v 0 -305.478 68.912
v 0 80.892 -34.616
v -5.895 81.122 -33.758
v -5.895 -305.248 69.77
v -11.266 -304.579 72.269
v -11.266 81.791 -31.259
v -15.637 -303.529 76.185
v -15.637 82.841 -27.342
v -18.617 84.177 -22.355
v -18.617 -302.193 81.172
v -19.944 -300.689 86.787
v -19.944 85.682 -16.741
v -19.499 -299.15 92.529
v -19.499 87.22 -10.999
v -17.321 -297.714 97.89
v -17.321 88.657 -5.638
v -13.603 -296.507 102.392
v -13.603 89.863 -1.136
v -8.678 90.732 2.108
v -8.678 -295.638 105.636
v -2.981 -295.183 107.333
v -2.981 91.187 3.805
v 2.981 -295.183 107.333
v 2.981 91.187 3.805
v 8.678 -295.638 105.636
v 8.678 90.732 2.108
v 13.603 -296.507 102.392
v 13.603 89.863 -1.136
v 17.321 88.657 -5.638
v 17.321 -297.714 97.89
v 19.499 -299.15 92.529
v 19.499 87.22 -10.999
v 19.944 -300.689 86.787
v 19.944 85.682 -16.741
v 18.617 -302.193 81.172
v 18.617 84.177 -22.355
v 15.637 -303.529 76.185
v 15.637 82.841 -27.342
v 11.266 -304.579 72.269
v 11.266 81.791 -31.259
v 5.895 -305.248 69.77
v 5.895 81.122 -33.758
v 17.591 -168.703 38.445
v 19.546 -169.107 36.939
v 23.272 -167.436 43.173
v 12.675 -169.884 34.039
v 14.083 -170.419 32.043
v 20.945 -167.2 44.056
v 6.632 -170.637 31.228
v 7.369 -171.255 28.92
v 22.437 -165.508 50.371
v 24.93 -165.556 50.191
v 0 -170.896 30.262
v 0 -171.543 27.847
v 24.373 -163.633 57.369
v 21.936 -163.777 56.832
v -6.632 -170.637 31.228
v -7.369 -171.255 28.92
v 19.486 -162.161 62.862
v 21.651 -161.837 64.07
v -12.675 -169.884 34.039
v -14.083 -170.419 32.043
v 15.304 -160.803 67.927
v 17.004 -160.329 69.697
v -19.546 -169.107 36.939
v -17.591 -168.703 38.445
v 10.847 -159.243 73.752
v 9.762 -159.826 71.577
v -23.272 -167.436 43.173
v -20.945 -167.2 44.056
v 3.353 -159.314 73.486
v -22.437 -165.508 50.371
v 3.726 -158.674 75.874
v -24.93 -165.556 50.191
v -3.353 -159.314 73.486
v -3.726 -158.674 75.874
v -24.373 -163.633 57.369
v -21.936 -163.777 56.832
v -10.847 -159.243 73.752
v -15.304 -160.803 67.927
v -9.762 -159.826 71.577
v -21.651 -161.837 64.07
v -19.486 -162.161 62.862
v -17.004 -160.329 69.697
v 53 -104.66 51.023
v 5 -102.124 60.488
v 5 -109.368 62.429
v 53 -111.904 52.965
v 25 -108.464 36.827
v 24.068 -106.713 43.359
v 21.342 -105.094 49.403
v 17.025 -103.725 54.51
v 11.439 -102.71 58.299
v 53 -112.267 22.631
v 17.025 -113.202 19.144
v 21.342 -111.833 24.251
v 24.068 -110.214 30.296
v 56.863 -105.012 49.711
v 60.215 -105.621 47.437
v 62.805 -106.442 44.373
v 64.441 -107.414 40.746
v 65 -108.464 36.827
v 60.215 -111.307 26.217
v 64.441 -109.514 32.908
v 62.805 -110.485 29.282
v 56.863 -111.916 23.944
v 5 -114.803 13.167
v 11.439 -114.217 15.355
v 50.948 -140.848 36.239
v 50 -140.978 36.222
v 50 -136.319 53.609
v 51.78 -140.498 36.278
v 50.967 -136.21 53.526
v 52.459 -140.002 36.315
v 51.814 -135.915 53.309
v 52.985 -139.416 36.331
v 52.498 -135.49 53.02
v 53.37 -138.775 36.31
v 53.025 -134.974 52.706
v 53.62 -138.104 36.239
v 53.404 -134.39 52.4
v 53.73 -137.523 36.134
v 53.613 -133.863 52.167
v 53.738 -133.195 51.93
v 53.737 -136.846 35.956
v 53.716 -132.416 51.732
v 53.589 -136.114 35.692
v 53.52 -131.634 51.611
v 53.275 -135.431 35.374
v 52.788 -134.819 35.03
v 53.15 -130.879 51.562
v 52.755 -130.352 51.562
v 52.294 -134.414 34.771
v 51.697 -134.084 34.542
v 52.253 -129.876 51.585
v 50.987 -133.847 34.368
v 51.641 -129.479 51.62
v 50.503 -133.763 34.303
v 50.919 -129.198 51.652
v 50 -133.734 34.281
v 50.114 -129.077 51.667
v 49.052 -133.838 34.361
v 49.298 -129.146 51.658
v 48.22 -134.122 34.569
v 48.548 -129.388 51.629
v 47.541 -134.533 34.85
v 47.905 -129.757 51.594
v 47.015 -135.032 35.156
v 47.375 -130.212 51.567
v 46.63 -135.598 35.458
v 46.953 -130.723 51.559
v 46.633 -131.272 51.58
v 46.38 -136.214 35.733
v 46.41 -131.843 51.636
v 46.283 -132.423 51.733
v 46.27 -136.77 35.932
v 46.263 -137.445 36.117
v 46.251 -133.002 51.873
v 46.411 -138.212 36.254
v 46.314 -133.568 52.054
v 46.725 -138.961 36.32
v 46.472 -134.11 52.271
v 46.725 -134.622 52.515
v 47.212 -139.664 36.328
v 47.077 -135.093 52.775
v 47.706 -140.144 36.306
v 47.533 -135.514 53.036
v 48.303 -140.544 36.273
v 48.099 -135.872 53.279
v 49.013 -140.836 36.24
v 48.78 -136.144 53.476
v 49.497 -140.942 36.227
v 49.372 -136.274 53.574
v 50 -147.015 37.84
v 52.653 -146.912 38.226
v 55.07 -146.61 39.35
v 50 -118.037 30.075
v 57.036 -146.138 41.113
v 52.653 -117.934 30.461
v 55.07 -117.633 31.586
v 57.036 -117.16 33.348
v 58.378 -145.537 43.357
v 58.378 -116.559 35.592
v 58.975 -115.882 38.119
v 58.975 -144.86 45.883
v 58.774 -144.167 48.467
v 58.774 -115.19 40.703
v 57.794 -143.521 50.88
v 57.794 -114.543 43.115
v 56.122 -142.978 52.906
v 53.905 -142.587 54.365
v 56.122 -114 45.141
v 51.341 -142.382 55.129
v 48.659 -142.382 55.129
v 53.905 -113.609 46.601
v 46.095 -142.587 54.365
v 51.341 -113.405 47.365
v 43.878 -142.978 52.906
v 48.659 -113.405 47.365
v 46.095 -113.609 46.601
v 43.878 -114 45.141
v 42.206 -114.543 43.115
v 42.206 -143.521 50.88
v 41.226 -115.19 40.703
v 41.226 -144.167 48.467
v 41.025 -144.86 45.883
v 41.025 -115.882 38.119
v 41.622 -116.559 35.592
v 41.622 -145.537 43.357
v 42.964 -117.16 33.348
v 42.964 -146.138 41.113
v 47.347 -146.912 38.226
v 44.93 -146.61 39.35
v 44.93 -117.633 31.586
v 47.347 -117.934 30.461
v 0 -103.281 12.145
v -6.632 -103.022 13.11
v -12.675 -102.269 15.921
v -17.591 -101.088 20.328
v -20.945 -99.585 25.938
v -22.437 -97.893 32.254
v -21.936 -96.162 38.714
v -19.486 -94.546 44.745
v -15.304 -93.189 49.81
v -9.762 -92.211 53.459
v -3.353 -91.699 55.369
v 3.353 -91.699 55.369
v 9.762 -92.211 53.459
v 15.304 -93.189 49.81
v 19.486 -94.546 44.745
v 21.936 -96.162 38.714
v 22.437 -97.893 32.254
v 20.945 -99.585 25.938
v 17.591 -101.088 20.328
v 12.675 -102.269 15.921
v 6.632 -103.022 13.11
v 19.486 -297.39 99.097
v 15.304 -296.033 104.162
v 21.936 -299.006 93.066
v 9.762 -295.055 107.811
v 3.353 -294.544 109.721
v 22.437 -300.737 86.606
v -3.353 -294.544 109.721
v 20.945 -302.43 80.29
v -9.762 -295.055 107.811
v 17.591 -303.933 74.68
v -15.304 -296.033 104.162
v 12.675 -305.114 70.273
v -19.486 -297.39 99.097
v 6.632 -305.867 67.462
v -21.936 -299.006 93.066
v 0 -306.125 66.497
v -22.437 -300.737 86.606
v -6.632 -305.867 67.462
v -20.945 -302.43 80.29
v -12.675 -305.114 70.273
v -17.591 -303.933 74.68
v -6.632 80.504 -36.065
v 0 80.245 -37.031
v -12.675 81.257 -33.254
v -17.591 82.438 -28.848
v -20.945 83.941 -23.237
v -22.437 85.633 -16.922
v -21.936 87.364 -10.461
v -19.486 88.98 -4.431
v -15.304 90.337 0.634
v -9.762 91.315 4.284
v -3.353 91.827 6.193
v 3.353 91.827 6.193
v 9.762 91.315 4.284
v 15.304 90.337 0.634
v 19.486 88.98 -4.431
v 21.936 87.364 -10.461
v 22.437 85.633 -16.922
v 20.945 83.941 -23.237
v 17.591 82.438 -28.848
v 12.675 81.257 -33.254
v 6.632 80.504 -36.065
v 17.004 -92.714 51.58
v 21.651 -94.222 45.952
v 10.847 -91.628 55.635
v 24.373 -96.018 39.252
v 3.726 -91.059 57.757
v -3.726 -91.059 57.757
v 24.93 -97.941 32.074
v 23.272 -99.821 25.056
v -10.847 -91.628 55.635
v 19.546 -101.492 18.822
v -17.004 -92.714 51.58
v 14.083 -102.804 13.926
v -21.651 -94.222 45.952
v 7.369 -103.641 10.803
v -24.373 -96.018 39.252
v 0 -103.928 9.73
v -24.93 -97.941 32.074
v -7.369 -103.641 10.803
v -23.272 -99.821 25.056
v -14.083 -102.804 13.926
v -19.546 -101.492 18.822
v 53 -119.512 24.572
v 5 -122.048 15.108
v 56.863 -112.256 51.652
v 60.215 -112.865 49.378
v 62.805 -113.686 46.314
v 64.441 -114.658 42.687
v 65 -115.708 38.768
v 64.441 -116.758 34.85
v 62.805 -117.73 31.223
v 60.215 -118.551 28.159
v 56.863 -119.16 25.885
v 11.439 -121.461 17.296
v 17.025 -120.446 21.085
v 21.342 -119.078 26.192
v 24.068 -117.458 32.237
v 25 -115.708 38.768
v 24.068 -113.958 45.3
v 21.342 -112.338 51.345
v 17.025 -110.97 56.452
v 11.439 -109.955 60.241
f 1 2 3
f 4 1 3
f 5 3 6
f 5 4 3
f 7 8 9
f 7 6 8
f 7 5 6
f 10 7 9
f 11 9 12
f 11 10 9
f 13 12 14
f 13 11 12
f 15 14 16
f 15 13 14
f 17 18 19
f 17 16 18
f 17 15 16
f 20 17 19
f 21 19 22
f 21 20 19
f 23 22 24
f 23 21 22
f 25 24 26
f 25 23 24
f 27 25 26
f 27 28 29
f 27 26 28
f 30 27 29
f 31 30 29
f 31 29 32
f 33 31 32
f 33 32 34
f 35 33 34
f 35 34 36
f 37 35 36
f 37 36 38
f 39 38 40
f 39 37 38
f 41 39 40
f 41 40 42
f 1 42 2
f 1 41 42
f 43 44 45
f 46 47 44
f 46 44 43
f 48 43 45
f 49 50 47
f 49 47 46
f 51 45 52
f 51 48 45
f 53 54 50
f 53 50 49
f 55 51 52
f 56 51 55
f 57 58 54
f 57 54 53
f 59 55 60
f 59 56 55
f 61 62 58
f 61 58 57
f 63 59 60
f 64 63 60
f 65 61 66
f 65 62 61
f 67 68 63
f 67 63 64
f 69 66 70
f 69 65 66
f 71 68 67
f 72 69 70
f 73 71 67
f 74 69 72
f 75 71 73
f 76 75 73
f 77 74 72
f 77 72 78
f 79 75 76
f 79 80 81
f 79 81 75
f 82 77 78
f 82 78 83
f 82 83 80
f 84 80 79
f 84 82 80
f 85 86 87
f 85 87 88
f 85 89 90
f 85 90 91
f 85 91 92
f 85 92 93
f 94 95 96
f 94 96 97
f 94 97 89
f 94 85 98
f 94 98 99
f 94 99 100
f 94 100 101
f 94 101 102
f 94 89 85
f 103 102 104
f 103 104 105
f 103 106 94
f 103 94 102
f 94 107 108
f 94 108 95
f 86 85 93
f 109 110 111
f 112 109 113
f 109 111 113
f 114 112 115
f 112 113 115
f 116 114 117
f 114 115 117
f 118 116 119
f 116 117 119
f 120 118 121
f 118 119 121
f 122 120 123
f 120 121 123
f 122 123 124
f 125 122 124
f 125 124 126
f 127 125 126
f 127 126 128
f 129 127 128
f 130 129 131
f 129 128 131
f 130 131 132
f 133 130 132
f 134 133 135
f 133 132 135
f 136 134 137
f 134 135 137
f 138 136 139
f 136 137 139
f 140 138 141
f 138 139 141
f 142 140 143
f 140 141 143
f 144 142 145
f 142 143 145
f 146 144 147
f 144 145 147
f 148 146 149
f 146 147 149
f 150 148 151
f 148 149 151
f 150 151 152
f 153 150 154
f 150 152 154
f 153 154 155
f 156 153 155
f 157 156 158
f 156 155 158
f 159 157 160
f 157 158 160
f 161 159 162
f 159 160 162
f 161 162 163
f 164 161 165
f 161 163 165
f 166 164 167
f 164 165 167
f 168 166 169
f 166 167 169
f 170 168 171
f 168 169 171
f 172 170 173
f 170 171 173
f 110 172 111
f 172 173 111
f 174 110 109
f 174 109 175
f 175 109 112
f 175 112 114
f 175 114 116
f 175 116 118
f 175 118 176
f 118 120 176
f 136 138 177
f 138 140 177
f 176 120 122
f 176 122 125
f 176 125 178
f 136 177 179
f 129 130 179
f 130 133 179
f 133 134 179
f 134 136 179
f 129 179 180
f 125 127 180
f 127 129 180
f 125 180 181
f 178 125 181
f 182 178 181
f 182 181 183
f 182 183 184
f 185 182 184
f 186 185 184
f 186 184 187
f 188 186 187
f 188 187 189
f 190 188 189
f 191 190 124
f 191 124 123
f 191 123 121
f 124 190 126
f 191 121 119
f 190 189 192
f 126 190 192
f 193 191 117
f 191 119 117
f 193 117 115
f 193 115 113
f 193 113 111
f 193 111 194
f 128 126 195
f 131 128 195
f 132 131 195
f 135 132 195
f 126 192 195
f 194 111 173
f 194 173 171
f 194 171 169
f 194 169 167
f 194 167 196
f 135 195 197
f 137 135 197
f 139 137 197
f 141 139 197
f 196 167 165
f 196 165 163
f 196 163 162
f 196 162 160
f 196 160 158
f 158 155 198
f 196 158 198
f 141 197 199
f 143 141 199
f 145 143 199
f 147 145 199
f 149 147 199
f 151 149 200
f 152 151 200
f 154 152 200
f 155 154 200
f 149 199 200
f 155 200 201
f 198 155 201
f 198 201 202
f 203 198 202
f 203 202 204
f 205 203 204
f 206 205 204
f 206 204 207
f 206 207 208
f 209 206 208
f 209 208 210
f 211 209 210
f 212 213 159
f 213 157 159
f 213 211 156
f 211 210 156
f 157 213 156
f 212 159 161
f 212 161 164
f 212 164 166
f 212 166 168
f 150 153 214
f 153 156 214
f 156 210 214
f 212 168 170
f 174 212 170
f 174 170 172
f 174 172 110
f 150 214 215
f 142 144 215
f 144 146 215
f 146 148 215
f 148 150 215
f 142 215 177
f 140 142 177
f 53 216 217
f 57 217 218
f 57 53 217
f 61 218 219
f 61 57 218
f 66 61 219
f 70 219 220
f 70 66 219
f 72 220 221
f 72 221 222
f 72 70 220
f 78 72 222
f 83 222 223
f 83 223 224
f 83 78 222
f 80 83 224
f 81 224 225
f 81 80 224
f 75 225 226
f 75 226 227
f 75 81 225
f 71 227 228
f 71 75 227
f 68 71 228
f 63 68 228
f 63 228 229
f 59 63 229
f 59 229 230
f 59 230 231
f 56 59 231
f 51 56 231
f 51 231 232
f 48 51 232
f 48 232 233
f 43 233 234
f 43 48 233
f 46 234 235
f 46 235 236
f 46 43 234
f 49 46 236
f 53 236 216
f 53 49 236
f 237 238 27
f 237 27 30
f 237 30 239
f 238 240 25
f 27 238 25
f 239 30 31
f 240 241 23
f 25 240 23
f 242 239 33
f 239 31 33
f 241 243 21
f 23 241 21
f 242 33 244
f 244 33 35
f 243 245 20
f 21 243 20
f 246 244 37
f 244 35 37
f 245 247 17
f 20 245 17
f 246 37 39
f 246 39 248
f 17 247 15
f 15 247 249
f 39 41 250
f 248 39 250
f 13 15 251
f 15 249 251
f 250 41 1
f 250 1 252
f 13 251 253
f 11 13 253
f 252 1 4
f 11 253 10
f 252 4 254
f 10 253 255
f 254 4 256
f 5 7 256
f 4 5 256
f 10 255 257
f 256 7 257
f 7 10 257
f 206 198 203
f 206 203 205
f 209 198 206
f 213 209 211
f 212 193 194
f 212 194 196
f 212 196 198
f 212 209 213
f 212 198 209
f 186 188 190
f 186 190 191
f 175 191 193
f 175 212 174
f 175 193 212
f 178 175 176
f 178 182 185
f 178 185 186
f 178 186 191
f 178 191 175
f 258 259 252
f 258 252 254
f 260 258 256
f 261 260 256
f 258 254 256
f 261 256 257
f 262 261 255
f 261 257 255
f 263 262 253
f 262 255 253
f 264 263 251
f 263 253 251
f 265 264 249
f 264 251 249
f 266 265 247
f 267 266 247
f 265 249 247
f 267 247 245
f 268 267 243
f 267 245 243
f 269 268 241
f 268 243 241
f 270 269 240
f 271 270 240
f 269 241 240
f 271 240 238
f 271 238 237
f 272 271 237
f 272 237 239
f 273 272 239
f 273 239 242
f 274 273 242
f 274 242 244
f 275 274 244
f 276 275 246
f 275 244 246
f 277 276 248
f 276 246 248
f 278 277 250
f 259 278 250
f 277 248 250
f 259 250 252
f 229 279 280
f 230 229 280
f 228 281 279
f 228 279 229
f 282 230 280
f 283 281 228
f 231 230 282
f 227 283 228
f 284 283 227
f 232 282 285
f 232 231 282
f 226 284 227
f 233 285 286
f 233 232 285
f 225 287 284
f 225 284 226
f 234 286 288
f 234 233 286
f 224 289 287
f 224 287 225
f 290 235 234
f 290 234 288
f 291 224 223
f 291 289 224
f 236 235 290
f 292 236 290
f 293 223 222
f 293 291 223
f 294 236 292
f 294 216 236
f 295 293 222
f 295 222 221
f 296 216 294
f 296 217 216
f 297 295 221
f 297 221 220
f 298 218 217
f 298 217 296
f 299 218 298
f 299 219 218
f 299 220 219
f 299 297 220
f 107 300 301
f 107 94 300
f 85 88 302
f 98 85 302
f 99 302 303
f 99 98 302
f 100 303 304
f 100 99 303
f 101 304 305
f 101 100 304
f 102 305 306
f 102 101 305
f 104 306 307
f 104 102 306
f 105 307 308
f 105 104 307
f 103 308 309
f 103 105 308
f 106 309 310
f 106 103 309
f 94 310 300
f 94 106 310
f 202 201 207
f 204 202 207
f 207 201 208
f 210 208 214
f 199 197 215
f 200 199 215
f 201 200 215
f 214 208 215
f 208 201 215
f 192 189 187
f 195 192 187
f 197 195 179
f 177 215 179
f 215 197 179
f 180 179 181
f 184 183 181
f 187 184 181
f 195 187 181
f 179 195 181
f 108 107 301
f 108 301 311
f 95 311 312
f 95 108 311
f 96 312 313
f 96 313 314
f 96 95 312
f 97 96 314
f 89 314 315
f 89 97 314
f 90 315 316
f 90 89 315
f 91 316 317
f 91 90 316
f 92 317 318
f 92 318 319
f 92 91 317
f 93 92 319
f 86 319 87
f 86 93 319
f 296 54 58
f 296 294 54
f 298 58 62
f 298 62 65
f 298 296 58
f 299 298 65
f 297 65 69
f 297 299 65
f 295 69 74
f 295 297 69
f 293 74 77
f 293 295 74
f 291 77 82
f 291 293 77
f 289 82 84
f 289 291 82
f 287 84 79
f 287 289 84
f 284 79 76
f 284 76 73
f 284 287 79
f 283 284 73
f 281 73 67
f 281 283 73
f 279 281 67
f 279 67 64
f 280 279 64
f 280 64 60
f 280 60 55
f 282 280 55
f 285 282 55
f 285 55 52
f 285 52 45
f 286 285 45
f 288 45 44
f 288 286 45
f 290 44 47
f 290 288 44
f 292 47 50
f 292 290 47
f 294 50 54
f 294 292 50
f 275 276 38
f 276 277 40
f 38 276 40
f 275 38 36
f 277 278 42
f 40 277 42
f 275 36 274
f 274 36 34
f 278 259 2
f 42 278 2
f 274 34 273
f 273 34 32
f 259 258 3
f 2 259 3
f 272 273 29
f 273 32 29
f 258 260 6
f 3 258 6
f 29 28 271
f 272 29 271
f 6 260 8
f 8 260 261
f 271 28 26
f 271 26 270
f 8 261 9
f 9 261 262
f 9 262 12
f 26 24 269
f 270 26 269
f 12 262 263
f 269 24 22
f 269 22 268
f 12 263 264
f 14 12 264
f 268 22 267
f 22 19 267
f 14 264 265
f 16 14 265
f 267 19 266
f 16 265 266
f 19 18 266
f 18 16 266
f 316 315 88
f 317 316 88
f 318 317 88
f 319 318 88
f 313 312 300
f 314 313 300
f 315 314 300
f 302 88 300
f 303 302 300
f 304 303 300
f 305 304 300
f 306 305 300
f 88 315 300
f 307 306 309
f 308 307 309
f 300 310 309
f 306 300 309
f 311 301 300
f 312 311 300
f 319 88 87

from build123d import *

# Parameters (mm, degrees)
BOSS_EXTRUDE1_DEPTH     = 3.75
SKETCH5_R               = 9
BOSS_EXTRUDE2_DEPTH     = 30
SHELL1_T                = -2.5
SKETCH6_R               = 3.75
CUT_EXTRUDE2_DEPTH      = 332.181551676
CUT_EXTRUDE2_DEPTH_BACK = 332.181551676


with BuildPart() as part:
    # Sketch2 → Revolve1 (revolve)
    with BuildSketch(Plane(origin=(0, 0, 0), x_dir=(0, 0, -1), z_dir=(1, 0, 0))):
        Polygon((37.030704723, 80.244921888), (-66.496913318, -306.125408627), (-88.23024441, -300.301980112), (15.297373631, 86.068350403), align=None)
    revolve(axis=Axis((0, -300.301980112, 88.23024441), (0, 0.9659258262890701, -0.25881904510251424)))

    # Shell1
    shell1_openings = [part.faces().sort_by_distance(p)[0] for p in [
        (0, -300.301980112, 88.23024441),
        (0, 86.068350403, -15.297373631),
    ]]
    offset(amount=SHELL1_T, openings=shell1_openings, kind=Kind.INTERSECTION)


with BuildPart() as body_2:
    # Sketch3 → Revolve2 (revolve)
    with BuildSketch(Plane(origin=(0, 0, 0), x_dir=(0, 0, -1), z_dir=(1, 0, 0))):
        Polygon((-12.144913847, -103.280985107), (-30.262247004, -170.895792947), (-27.847432438, -171.54284056), (-9.730099281, -103.928032719), align=None)
    revolve(axis=Axis((0, -300.301980112, 88.23024441), (0, 0.9659258262890701, -0.25881904510251424)))


with BuildPart() as body_3:
    # Sketch4 → Boss-Extrude1 (new, symmetric)
    with BuildSketch(Plane(origin=(0, -114.02695461, 30.553430403), x_dir=(1, 0, 0), z_dir=(0, 0.96592582628907, -0.25881904510251447))):
        with BuildLine():
            Line((53, 7.196938457), (5, 16.994897428))
            ThreePointArc((5, 16.994897428), (25, -7.5), (5, -31.994897428))
            Line((5, -31.994897428), (53, -22.196938457))
            ThreePointArc((53, -22.196938457), (65, -7.5), (53, 7.196938457))
        make_face()
    extrude(amount=BOSS_EXTRUDE1_DEPTH, both=True)


with BuildPart() as body_4:
    # Sketch5 → Boss-Extrude2 (new body)
    with BuildSketch(Plane(origin=(0, -117.649176458, 31.524001822), x_dir=(1, 0, 0), z_dir=(0, -0.96592582628907, 0.25881904510251447))):
        with Locations(Location((50, 7.5, 0), (0, 0, 270))):
            Circle(SKETCH5_R)
    extrude(amount=BOSS_EXTRUDE2_DEPTH)

    # Sketch6 → Cut-Extrude2 (cut, two sides)
    with BuildSketch(Plane(origin=(0, 1.941142838, 7.244443697), x_dir=(1, 0, 0), z_dir=(0, 0.2588190451025143, 0.9659258262890701))) as cut_extrude2_sk:
        with Locations(Location((50, -141.799390032, 0), (0, 0, 270))):
            Circle(SKETCH6_R)
    extrude(amount=CUT_EXTRUDE2_DEPTH, mode=Mode.SUBTRACT)
    extrude(cut_extrude2_sk.sketch, amount=-CUT_EXTRUDE2_DEPTH_BACK, mode=Mode.SUBTRACT)


solid = Compound([part.part, body_2.part, body_3.part, body_4.part])
